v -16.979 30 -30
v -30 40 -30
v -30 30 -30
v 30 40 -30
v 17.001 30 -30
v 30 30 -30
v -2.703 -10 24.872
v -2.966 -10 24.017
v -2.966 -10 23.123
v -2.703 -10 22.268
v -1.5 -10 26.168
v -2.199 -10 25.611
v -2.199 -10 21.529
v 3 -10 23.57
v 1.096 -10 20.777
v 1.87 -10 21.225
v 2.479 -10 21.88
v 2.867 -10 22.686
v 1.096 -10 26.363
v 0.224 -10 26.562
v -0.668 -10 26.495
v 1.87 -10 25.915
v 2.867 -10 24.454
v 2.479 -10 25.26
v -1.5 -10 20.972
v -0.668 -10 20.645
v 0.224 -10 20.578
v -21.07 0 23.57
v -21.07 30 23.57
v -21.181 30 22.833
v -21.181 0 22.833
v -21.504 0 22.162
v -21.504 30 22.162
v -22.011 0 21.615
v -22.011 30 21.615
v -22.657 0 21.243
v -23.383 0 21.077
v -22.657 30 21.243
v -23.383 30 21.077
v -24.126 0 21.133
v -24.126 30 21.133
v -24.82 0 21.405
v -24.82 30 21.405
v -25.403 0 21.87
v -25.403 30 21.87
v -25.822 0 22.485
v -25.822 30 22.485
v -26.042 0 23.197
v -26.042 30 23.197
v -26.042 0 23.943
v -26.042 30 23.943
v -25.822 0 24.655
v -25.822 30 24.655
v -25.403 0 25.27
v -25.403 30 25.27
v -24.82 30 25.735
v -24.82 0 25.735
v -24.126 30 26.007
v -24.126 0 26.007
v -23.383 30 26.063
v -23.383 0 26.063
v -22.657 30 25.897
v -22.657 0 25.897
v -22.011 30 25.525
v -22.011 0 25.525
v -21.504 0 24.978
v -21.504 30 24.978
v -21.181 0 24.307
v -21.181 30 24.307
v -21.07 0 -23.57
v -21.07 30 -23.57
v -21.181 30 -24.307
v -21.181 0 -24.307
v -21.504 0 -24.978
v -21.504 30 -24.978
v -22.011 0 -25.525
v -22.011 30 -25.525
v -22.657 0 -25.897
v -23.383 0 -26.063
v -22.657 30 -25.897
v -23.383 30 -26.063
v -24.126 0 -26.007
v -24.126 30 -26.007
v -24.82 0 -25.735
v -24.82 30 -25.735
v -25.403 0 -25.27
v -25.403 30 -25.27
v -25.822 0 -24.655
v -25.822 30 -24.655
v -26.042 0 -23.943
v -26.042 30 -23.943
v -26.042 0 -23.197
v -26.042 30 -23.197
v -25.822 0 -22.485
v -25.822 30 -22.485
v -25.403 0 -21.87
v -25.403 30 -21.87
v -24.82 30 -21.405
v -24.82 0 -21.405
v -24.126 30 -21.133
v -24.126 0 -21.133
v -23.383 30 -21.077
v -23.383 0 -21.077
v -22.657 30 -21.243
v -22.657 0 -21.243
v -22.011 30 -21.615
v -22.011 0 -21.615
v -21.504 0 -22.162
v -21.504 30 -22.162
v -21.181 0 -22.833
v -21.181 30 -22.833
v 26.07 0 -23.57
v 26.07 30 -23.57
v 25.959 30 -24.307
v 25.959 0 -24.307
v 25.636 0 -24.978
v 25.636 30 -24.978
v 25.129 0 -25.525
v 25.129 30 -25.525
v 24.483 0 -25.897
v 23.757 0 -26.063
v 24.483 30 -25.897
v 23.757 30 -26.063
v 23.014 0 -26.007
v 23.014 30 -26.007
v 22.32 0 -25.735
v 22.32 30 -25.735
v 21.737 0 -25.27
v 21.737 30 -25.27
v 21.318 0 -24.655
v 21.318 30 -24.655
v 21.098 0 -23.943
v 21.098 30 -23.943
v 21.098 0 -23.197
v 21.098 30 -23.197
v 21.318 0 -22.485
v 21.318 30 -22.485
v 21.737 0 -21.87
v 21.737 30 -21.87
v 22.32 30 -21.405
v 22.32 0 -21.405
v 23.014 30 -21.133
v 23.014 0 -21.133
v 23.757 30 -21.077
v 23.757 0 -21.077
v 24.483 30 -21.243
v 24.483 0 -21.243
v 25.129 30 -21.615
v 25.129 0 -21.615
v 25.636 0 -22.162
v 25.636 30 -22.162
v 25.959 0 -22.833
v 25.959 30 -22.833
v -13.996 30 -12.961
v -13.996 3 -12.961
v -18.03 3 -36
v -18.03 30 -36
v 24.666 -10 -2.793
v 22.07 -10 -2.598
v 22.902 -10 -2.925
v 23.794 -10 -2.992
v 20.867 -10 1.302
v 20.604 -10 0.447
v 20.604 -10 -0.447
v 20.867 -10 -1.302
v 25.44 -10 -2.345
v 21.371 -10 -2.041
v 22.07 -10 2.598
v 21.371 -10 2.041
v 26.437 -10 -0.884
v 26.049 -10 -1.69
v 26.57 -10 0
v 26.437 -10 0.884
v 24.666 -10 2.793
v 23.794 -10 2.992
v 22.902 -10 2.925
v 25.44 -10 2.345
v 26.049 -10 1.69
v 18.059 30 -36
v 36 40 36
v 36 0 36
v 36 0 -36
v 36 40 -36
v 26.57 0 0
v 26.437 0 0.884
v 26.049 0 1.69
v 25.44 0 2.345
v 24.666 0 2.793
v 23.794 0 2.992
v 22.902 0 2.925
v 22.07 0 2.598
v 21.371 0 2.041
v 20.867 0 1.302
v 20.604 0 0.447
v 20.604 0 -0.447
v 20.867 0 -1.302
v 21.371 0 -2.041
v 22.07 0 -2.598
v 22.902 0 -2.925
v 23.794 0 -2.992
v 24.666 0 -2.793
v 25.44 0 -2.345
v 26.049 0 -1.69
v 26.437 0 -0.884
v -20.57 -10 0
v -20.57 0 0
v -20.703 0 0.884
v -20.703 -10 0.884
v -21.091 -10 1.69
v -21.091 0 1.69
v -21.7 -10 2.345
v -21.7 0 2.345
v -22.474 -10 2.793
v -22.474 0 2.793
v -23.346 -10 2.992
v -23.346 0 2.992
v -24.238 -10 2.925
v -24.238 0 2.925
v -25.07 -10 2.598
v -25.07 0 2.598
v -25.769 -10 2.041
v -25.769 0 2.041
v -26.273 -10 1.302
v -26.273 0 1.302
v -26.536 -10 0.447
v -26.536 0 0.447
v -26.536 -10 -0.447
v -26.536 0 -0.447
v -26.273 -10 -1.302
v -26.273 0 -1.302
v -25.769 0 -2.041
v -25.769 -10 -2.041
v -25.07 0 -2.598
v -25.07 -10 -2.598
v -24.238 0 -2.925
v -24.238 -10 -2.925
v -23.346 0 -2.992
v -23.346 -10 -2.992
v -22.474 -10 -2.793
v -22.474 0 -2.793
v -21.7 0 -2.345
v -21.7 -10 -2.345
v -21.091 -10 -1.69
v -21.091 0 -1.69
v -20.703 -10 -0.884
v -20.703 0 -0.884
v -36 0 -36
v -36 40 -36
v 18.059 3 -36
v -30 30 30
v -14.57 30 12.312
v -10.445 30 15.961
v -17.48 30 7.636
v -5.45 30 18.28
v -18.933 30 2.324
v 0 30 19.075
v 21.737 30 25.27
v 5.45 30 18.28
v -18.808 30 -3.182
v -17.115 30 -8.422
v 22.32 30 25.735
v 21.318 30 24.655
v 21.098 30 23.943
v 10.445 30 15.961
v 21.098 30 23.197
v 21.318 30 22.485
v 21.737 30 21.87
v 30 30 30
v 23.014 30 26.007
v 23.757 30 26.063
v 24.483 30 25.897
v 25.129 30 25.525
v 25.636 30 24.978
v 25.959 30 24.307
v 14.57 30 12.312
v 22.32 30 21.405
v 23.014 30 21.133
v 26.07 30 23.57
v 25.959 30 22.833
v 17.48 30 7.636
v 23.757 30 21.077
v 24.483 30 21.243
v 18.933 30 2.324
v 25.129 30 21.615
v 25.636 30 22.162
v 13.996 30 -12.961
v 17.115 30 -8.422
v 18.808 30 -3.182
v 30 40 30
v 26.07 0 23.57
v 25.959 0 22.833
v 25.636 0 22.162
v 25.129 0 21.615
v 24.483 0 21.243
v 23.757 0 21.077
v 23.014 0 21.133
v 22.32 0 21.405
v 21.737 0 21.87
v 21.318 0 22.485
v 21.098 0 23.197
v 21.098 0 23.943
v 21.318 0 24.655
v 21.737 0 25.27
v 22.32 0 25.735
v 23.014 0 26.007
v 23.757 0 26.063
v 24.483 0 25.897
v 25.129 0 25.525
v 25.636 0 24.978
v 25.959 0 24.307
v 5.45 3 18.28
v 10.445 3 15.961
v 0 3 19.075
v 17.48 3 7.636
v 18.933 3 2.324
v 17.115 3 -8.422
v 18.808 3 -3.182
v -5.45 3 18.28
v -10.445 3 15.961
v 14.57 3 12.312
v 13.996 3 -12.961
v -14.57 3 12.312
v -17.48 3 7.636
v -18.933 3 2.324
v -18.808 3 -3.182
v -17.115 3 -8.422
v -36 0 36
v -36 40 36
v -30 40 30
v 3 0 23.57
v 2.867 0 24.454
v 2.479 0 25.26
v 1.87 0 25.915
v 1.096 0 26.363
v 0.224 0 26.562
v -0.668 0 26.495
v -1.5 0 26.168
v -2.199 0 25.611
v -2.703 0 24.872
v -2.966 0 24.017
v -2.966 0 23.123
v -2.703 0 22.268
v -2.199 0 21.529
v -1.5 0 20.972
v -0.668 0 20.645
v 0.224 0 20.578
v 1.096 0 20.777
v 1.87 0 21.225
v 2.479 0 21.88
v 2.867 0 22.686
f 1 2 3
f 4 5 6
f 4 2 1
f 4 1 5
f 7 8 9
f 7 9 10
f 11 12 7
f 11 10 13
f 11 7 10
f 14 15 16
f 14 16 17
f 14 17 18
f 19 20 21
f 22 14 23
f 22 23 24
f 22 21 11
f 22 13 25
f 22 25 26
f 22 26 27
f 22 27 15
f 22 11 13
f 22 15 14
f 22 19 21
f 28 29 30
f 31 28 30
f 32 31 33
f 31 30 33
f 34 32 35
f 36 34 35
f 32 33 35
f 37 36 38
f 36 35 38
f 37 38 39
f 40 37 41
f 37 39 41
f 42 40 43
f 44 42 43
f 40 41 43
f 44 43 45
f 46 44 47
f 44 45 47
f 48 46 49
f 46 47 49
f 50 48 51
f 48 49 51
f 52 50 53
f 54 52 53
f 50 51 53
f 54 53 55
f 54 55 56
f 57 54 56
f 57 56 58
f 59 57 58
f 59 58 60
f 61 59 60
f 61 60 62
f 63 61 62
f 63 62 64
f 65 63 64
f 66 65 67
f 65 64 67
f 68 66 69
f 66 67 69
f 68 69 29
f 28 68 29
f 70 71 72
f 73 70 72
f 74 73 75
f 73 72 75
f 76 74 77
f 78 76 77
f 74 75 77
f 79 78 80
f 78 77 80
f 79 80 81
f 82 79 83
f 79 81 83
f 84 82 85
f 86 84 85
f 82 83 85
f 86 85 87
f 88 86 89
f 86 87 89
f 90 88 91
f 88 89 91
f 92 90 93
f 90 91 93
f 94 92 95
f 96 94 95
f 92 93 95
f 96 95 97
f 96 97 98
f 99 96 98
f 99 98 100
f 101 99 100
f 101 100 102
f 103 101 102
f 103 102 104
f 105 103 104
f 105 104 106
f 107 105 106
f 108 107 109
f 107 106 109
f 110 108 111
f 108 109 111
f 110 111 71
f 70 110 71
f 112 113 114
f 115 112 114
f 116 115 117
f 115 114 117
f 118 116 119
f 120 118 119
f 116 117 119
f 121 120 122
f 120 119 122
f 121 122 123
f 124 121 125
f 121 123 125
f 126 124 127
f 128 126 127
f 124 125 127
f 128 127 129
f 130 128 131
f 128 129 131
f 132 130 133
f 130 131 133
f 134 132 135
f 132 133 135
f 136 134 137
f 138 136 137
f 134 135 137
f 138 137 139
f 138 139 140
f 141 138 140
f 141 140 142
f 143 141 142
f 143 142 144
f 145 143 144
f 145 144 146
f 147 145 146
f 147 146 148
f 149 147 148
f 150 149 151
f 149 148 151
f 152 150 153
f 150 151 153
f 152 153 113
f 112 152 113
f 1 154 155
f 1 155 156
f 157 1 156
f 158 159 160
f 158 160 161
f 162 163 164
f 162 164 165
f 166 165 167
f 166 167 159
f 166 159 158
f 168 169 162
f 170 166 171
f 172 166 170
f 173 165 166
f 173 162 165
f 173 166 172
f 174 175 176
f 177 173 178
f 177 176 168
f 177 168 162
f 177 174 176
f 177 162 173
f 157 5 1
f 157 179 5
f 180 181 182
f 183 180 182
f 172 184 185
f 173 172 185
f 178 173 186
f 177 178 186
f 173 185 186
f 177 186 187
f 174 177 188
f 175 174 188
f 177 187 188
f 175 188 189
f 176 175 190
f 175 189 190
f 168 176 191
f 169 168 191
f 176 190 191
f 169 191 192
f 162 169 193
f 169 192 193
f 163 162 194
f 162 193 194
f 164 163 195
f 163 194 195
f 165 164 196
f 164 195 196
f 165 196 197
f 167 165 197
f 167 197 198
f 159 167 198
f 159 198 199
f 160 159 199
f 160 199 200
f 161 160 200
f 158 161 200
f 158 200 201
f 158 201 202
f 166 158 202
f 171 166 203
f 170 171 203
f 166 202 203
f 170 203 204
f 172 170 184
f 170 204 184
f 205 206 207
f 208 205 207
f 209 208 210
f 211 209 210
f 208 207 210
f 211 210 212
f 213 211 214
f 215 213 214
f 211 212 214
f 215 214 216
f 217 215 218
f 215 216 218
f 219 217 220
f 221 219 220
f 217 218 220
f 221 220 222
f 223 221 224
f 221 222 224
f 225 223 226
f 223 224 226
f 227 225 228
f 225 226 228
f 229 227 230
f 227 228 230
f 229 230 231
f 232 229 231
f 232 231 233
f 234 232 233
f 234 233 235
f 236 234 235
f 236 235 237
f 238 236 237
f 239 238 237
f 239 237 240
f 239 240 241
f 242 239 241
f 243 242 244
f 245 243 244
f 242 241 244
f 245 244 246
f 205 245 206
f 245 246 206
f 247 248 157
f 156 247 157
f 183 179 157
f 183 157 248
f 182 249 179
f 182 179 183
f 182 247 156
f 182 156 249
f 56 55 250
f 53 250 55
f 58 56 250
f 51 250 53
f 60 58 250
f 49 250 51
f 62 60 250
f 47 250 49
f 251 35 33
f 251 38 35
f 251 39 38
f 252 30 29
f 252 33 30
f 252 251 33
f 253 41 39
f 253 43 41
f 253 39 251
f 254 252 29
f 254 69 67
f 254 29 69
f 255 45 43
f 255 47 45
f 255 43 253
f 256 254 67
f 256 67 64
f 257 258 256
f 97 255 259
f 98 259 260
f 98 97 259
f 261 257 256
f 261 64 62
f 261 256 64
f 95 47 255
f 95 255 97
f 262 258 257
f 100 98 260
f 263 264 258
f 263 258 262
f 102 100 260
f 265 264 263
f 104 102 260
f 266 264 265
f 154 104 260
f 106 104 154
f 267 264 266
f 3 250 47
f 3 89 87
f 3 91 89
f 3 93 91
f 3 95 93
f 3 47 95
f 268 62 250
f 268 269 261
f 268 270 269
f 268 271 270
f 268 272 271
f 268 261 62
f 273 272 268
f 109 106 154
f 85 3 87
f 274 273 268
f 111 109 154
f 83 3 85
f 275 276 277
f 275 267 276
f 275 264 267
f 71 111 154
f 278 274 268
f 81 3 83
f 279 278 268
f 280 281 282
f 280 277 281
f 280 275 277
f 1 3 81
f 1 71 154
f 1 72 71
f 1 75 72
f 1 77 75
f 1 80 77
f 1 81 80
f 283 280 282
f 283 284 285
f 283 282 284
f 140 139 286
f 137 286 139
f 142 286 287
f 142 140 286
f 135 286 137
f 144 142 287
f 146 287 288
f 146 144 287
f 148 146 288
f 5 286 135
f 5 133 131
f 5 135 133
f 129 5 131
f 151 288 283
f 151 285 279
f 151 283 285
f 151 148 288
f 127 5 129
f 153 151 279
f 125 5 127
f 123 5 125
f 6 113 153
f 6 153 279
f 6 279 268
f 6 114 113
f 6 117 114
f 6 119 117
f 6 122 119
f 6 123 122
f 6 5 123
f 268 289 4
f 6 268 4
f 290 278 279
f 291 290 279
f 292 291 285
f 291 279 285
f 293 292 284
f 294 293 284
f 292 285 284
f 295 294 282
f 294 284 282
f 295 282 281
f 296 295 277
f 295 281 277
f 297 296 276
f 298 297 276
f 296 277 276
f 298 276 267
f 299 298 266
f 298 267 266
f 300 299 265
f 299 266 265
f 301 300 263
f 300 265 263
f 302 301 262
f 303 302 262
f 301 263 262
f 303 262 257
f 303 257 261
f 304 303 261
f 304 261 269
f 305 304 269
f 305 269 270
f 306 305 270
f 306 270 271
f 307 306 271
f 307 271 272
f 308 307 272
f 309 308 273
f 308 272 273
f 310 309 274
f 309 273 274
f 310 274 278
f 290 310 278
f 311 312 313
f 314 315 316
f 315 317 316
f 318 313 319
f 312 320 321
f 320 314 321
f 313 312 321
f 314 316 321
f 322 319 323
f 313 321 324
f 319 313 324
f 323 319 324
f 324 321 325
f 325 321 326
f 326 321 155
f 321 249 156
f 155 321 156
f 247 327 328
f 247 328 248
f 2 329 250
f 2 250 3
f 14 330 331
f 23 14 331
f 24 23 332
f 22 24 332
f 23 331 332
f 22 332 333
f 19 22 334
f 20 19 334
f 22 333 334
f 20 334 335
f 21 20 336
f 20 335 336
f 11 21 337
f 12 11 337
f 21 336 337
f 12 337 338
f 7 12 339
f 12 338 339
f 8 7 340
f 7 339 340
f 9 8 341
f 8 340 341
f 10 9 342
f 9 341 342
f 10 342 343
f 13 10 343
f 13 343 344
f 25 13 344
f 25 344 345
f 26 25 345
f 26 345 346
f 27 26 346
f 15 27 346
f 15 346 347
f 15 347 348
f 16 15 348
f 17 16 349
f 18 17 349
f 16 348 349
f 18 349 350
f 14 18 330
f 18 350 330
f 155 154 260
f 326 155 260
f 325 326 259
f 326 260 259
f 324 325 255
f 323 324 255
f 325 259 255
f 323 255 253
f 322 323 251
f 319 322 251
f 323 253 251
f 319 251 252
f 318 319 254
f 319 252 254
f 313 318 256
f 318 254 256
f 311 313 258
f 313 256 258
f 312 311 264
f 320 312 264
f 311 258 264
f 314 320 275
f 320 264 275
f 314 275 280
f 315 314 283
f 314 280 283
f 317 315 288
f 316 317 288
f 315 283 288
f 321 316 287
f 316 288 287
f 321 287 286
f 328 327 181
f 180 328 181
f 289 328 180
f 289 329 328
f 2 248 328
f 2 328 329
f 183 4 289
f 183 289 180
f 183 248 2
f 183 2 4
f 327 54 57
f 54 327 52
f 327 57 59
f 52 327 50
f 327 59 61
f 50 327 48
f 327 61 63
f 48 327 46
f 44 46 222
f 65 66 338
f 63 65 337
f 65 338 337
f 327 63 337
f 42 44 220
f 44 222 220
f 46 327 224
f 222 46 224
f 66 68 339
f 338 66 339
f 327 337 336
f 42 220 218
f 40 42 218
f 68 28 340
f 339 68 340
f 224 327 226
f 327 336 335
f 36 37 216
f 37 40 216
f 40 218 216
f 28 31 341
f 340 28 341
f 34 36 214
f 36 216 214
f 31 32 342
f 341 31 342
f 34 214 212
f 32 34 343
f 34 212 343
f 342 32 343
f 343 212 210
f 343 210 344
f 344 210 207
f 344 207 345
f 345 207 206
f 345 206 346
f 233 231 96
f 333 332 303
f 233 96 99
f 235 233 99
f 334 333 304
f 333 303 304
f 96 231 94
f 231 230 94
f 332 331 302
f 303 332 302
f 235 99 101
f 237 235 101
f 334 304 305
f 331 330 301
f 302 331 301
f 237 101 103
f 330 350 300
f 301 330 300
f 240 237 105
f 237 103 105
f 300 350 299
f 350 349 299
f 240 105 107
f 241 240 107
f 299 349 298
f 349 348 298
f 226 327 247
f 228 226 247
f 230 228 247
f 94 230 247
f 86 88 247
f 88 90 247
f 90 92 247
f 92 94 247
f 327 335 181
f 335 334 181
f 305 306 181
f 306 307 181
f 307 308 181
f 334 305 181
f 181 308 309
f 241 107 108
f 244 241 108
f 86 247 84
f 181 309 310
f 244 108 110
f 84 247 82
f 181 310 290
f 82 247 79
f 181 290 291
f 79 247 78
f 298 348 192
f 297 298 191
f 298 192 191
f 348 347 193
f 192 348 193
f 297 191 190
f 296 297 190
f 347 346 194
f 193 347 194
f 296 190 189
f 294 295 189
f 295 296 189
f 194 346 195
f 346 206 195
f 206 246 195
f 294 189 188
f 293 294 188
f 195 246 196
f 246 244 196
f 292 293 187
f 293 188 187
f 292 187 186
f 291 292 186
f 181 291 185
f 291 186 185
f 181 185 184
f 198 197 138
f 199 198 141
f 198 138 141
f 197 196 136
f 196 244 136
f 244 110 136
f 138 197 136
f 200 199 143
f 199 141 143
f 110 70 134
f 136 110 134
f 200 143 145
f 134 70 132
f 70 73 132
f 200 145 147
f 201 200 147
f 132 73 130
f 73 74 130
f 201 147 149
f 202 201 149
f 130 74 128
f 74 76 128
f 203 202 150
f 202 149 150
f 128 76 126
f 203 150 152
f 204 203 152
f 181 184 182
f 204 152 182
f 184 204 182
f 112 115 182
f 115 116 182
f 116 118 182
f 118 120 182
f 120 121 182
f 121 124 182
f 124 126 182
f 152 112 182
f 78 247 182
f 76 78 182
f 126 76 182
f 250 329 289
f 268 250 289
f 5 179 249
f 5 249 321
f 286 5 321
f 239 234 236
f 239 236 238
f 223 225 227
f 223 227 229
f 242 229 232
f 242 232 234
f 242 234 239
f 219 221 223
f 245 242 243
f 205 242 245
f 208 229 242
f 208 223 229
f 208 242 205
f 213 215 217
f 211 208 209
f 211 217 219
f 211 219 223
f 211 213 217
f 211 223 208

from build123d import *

# Parameters (mm, degrees)
SKETCH1_W           = 72
SKETCH1_H           = 72
BOSS_EXTRUDE1_DEPTH = 40
SKETCH3_W           = 60
SKETCH3_H           = 60
CUT_EXTRUDE1_DEPTH  = 10
SKETCH4_R           = 2.5
CUT_EXTRUDE2_DEPTH  = 30
SKETCH5_R           = 19.075
CUT_EXTRUDE3_DEPTH  = 27
CUT_EXTRUDE5_DEPTH  = 27
SKETCH13_R          = 3
BOSS_EXTRUDE3_DEPTH = 10


with BuildPart() as part:
    # Sketch1 → Boss-Extrude1 (new body)
    with BuildSketch(Plane(origin=(0, 0, 0), x_dir=(1, 0, 0), z_dir=(0, 1, 0))):
        Rectangle(SKETCH1_W, SKETCH1_H)
    extrude(amount=BOSS_EXTRUDE1_DEPTH)

    # Sketch3 → Cut-Extrude1 (cut)
    with BuildSketch(Plane(origin=(0, 40, 0), x_dir=(1, 0, 0), z_dir=(0, 1, 0))):
        Rectangle(SKETCH3_W, SKETCH3_H)
    extrude(amount=-CUT_EXTRUDE1_DEPTH, mode=Mode.SUBTRACT)

    # Sketch4 → Cut-Extrude2 (cut)
    with BuildSketch(Plane(origin=(0, 30, 0), x_dir=(1, 0, 0), z_dir=(0, 1, 0))):
        with Locations((-23.57, 23.57)):
            Circle(SKETCH4_R)
        with Locations((23.57, 23.57)):
            Circle(SKETCH4_R)
        with Locations((23.57, -23.57)):
            Circle(SKETCH4_R)
        with Locations((-23.57, -23.57)):
            Circle(SKETCH4_R)
    extrude(amount=-CUT_EXTRUDE2_DEPTH, mode=Mode.SUBTRACT)

    # Sketch5 → Cut-Extrude3 (cut)
    with BuildSketch(Plane(origin=(0, 30, 0), x_dir=(1, 0, 0), z_dir=(0, 1, 0))):
        Circle(SKETCH5_R)
    extrude(amount=-CUT_EXTRUDE3_DEPTH, mode=Mode.SUBTRACT)

    # Sketch6 → Cut-Extrude5 (cut)
    with BuildSketch(Plane(origin=(0, 30, 0), x_dir=(1, 0, 0), z_dir=(0, 1, 0))):
        with BuildLine():
            Line((-13.99552044, 12.960749693), (-18.030218489, 36))
            Line((-18.030218489, 36), (18.058704295, 36))
            Line((18.058704295, 36), (13.99552044, 12.960749693))
            ThreePointArc((13.99552044, 12.960749693), (0, 19.075), (-13.99552044, 12.960749693))
        make_face()
    extrude(amount=-CUT_EXTRUDE5_DEPTH, mode=Mode.SUBTRACT)

    # Sketch13 → Boss-Extrude3 (add)
    with BuildSketch(Plane.XZ):
        with Locations((0, 23.57)):
            Circle(SKETCH13_R)
        with Locations((23.57, 0)):
            Circle(SKETCH13_R)
        with Locations((-23.57, 0)):
            Circle(SKETCH13_R)
    extrude(amount=BOSS_EXTRUDE3_DEPTH)


solid = part.part
